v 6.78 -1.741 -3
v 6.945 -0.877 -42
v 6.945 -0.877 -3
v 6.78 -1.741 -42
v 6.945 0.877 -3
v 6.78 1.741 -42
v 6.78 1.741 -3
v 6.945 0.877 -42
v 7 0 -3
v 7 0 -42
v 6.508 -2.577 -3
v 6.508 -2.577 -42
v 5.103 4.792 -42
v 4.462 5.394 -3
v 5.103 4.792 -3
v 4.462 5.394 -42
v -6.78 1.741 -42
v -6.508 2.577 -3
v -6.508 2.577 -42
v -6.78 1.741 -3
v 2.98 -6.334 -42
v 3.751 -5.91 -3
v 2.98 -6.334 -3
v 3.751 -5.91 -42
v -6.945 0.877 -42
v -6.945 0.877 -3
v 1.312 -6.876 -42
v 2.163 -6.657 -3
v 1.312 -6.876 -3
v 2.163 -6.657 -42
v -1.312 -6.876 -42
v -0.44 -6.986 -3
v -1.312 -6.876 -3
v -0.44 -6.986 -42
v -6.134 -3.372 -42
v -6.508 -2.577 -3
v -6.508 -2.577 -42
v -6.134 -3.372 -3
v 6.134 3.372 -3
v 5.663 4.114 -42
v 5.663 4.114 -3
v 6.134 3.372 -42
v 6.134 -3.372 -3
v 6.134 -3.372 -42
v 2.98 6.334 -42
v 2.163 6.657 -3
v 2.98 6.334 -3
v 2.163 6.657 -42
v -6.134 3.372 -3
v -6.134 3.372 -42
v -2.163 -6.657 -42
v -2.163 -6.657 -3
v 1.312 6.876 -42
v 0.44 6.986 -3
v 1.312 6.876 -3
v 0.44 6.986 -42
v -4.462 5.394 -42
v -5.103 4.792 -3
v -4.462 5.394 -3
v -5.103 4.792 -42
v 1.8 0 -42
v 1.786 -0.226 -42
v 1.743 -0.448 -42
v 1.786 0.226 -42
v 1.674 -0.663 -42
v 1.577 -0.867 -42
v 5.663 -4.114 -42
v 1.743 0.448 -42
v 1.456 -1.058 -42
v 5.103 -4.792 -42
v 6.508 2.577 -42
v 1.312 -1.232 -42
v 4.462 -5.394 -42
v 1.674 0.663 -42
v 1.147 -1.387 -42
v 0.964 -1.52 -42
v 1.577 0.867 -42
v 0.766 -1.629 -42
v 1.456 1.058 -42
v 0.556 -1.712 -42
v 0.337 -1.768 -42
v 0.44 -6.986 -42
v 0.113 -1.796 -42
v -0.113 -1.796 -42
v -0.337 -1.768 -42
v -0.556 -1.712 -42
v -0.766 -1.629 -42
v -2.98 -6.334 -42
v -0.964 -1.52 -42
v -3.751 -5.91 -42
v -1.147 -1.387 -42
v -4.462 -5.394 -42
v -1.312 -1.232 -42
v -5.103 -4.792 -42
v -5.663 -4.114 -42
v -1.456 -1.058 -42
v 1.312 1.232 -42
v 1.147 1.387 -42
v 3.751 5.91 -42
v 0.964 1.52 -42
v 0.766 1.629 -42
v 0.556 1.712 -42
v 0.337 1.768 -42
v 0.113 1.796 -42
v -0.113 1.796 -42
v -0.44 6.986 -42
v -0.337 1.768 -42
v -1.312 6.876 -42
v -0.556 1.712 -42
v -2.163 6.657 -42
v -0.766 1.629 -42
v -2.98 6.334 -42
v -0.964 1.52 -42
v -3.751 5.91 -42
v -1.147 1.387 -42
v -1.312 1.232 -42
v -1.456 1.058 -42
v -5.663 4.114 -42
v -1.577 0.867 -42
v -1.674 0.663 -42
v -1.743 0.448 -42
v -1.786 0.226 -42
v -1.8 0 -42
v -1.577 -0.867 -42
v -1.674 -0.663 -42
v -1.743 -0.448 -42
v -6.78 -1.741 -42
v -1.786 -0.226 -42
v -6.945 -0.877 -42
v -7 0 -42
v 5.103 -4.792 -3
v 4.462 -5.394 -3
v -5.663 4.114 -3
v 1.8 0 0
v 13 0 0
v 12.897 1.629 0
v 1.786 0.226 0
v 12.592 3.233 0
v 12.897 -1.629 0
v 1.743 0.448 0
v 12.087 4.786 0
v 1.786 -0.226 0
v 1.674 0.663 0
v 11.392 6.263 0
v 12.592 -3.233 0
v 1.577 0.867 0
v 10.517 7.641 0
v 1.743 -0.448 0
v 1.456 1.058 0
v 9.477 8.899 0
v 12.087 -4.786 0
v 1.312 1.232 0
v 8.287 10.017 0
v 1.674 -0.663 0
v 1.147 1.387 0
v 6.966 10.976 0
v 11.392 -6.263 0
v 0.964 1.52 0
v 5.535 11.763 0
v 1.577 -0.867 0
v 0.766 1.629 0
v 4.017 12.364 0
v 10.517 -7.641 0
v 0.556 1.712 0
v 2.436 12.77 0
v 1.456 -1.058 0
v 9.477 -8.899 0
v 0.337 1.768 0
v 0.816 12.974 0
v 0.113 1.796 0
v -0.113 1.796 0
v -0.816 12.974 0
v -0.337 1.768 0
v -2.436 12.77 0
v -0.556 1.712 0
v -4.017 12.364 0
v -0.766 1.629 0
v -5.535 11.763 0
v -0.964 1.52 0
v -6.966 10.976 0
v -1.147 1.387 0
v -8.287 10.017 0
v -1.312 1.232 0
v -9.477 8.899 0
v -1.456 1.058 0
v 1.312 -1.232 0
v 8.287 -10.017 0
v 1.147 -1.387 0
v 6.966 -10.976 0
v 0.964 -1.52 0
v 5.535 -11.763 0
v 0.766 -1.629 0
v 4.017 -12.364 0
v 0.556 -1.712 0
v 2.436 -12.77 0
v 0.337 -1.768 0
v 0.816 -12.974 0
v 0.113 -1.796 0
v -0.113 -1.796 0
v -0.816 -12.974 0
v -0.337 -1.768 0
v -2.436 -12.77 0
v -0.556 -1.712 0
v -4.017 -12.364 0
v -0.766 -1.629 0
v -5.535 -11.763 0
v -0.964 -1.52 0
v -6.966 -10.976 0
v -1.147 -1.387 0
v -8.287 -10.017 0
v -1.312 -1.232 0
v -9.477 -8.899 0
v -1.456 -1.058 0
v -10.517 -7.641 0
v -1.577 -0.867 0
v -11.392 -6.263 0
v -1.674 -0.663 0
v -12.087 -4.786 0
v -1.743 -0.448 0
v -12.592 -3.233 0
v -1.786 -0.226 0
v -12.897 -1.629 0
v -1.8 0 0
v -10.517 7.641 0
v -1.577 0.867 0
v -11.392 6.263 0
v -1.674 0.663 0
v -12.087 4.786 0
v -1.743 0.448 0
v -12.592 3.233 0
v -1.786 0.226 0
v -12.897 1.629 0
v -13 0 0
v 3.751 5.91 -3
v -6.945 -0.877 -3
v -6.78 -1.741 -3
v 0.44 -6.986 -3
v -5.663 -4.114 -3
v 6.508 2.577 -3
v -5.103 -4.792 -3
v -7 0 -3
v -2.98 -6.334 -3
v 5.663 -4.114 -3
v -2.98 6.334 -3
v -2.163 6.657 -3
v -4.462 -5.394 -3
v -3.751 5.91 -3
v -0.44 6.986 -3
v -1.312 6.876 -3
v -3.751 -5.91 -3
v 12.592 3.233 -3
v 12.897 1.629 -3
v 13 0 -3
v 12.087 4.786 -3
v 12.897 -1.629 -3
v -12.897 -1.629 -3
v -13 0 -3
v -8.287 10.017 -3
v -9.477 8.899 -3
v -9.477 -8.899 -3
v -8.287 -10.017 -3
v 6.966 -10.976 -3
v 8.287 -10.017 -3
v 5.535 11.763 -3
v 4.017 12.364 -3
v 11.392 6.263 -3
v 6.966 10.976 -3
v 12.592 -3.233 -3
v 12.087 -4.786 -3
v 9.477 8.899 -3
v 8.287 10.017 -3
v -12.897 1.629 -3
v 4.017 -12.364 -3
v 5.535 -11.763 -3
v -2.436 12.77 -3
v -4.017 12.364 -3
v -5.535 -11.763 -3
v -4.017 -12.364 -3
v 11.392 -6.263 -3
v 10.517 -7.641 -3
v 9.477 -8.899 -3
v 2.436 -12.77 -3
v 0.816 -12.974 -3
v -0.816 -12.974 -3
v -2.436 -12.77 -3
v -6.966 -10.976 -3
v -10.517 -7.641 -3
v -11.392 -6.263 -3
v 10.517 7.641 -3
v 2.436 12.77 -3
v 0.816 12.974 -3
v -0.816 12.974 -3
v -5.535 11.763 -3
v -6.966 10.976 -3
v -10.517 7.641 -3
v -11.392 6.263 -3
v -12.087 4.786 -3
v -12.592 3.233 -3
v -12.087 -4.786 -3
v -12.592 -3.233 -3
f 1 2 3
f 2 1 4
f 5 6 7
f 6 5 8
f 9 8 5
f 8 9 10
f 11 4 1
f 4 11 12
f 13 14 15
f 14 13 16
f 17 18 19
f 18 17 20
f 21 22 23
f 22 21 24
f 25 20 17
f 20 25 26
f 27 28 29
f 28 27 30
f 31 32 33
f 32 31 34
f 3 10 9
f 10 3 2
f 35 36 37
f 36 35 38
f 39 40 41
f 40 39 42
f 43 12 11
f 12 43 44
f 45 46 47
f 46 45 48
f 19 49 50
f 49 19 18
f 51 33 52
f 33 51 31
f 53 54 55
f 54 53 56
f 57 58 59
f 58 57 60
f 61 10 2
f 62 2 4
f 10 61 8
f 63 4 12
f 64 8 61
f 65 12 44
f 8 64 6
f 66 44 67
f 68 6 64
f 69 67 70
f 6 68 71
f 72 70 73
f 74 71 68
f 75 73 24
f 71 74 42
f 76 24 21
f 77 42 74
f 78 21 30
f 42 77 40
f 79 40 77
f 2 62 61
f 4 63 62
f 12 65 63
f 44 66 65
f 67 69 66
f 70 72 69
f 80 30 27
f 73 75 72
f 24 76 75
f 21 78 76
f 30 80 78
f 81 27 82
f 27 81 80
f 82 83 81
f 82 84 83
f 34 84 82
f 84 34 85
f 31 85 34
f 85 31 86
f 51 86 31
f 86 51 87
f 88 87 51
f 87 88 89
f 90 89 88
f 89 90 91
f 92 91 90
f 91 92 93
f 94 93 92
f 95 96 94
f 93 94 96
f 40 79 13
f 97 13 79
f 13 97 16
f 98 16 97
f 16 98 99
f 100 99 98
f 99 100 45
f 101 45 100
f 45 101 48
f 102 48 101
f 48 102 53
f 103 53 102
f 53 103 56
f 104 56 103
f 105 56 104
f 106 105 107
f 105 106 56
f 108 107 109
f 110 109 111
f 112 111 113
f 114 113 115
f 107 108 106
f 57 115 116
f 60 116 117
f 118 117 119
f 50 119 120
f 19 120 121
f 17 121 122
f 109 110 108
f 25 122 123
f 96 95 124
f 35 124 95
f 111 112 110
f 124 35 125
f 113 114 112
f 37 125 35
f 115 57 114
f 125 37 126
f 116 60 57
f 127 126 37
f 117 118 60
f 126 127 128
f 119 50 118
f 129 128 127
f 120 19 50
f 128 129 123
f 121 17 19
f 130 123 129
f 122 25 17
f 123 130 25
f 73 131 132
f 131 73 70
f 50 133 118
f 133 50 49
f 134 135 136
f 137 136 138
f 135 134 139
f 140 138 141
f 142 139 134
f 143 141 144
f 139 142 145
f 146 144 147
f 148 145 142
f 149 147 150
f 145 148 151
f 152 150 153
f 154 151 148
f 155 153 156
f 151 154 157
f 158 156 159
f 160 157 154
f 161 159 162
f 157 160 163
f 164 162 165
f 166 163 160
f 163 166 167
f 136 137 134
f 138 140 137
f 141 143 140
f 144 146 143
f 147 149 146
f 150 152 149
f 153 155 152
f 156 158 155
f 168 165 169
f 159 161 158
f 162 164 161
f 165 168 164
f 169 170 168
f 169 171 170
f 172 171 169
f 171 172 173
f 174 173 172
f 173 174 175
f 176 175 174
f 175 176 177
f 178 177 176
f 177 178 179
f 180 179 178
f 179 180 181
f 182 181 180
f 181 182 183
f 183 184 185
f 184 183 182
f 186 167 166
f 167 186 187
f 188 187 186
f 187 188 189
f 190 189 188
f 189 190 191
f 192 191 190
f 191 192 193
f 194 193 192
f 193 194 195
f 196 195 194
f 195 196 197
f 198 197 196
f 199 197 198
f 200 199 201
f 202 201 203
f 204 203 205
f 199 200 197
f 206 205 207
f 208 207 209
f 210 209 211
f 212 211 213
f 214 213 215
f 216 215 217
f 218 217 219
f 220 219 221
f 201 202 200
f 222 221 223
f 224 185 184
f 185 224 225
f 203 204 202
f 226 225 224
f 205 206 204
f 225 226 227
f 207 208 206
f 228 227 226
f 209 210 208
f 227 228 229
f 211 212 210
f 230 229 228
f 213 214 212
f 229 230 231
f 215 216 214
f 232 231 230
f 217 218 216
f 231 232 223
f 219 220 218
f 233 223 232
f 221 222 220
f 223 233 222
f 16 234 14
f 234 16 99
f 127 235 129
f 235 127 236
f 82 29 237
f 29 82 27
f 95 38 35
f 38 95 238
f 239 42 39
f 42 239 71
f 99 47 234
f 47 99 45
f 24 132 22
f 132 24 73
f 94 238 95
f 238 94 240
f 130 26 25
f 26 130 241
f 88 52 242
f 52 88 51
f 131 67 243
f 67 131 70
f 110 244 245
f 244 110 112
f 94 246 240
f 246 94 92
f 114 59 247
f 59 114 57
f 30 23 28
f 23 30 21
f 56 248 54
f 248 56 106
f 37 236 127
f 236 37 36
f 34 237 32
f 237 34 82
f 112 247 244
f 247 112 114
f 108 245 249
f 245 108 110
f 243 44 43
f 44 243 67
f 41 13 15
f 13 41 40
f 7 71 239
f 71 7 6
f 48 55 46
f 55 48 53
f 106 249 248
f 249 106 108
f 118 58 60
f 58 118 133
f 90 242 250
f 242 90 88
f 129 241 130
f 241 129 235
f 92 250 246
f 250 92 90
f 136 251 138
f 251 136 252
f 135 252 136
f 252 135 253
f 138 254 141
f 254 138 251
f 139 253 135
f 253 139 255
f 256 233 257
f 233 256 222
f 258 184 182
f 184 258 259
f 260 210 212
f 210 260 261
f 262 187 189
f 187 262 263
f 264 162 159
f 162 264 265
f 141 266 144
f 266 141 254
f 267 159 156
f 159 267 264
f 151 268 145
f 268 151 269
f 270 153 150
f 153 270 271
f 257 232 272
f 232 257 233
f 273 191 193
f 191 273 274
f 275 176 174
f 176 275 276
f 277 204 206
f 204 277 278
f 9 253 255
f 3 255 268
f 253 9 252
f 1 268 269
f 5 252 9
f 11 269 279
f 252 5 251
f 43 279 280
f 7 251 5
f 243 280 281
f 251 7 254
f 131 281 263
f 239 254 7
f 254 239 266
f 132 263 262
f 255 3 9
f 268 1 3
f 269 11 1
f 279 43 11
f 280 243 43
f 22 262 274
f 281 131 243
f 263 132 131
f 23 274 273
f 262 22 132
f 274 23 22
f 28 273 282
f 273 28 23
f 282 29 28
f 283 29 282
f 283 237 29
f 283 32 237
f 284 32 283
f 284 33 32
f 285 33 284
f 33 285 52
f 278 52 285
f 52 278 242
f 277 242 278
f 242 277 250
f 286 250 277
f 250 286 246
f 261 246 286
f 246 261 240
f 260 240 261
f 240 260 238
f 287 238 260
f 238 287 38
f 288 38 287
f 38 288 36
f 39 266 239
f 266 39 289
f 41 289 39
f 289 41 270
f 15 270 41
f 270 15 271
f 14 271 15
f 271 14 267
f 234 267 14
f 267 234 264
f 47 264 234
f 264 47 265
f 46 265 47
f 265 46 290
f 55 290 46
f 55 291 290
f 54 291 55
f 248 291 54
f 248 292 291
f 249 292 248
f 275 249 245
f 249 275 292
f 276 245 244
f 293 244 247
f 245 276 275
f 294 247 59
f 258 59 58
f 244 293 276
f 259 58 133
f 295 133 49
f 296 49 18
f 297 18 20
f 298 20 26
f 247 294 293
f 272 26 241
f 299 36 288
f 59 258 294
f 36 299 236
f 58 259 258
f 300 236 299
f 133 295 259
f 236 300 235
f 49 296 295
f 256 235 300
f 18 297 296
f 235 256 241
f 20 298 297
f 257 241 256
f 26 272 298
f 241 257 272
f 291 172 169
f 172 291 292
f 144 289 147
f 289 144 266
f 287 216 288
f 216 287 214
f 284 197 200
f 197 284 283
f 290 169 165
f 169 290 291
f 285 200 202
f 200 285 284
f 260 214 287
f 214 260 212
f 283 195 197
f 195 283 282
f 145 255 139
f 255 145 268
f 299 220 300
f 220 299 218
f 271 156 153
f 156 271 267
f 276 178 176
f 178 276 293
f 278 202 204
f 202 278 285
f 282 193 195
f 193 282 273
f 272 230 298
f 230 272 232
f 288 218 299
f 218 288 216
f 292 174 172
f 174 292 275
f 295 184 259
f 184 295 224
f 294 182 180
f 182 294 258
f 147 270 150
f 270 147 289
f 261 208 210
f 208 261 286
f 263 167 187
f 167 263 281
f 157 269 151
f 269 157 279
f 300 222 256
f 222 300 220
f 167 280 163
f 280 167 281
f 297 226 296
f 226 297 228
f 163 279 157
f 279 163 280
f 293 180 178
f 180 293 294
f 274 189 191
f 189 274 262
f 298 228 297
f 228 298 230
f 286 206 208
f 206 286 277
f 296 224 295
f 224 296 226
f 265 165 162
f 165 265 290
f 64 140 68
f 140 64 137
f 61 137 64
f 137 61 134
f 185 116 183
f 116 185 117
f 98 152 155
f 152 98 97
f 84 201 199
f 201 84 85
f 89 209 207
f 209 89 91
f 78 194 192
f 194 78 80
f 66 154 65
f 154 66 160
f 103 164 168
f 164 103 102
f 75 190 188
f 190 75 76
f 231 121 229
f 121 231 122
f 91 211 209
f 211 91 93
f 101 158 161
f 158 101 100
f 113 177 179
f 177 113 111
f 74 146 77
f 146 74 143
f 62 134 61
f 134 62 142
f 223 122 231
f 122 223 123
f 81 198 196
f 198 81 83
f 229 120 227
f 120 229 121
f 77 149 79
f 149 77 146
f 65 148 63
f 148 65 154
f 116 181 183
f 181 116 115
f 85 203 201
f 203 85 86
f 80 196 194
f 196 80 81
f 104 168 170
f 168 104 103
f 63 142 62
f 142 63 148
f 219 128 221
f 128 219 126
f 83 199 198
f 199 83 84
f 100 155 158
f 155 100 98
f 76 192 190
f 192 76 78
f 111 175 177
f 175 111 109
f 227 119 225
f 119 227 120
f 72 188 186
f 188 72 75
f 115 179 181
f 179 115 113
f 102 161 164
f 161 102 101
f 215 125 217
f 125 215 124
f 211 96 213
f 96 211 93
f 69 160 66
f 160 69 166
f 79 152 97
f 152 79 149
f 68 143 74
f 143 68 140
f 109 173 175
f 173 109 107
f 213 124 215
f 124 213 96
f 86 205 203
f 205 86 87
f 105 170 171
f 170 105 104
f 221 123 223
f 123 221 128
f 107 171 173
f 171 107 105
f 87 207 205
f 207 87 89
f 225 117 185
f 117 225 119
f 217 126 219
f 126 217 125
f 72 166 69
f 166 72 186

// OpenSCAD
$fn = 50;


difference() {
	union() {
		translate(v = [0, 0, -42.0000000000]) {
			cylinder(h = 42, r = 7.0000000000);
		}
		translate(v = [0, 0, -3.0000000000]) {
			cylinder(h = 3, r = 13.0000000000);
		}
	}
	union() {
		#translate(v = [0, 0, -42]) {
			cylinder(h = 42, r = 1.8000000000);
		}
	}
}
